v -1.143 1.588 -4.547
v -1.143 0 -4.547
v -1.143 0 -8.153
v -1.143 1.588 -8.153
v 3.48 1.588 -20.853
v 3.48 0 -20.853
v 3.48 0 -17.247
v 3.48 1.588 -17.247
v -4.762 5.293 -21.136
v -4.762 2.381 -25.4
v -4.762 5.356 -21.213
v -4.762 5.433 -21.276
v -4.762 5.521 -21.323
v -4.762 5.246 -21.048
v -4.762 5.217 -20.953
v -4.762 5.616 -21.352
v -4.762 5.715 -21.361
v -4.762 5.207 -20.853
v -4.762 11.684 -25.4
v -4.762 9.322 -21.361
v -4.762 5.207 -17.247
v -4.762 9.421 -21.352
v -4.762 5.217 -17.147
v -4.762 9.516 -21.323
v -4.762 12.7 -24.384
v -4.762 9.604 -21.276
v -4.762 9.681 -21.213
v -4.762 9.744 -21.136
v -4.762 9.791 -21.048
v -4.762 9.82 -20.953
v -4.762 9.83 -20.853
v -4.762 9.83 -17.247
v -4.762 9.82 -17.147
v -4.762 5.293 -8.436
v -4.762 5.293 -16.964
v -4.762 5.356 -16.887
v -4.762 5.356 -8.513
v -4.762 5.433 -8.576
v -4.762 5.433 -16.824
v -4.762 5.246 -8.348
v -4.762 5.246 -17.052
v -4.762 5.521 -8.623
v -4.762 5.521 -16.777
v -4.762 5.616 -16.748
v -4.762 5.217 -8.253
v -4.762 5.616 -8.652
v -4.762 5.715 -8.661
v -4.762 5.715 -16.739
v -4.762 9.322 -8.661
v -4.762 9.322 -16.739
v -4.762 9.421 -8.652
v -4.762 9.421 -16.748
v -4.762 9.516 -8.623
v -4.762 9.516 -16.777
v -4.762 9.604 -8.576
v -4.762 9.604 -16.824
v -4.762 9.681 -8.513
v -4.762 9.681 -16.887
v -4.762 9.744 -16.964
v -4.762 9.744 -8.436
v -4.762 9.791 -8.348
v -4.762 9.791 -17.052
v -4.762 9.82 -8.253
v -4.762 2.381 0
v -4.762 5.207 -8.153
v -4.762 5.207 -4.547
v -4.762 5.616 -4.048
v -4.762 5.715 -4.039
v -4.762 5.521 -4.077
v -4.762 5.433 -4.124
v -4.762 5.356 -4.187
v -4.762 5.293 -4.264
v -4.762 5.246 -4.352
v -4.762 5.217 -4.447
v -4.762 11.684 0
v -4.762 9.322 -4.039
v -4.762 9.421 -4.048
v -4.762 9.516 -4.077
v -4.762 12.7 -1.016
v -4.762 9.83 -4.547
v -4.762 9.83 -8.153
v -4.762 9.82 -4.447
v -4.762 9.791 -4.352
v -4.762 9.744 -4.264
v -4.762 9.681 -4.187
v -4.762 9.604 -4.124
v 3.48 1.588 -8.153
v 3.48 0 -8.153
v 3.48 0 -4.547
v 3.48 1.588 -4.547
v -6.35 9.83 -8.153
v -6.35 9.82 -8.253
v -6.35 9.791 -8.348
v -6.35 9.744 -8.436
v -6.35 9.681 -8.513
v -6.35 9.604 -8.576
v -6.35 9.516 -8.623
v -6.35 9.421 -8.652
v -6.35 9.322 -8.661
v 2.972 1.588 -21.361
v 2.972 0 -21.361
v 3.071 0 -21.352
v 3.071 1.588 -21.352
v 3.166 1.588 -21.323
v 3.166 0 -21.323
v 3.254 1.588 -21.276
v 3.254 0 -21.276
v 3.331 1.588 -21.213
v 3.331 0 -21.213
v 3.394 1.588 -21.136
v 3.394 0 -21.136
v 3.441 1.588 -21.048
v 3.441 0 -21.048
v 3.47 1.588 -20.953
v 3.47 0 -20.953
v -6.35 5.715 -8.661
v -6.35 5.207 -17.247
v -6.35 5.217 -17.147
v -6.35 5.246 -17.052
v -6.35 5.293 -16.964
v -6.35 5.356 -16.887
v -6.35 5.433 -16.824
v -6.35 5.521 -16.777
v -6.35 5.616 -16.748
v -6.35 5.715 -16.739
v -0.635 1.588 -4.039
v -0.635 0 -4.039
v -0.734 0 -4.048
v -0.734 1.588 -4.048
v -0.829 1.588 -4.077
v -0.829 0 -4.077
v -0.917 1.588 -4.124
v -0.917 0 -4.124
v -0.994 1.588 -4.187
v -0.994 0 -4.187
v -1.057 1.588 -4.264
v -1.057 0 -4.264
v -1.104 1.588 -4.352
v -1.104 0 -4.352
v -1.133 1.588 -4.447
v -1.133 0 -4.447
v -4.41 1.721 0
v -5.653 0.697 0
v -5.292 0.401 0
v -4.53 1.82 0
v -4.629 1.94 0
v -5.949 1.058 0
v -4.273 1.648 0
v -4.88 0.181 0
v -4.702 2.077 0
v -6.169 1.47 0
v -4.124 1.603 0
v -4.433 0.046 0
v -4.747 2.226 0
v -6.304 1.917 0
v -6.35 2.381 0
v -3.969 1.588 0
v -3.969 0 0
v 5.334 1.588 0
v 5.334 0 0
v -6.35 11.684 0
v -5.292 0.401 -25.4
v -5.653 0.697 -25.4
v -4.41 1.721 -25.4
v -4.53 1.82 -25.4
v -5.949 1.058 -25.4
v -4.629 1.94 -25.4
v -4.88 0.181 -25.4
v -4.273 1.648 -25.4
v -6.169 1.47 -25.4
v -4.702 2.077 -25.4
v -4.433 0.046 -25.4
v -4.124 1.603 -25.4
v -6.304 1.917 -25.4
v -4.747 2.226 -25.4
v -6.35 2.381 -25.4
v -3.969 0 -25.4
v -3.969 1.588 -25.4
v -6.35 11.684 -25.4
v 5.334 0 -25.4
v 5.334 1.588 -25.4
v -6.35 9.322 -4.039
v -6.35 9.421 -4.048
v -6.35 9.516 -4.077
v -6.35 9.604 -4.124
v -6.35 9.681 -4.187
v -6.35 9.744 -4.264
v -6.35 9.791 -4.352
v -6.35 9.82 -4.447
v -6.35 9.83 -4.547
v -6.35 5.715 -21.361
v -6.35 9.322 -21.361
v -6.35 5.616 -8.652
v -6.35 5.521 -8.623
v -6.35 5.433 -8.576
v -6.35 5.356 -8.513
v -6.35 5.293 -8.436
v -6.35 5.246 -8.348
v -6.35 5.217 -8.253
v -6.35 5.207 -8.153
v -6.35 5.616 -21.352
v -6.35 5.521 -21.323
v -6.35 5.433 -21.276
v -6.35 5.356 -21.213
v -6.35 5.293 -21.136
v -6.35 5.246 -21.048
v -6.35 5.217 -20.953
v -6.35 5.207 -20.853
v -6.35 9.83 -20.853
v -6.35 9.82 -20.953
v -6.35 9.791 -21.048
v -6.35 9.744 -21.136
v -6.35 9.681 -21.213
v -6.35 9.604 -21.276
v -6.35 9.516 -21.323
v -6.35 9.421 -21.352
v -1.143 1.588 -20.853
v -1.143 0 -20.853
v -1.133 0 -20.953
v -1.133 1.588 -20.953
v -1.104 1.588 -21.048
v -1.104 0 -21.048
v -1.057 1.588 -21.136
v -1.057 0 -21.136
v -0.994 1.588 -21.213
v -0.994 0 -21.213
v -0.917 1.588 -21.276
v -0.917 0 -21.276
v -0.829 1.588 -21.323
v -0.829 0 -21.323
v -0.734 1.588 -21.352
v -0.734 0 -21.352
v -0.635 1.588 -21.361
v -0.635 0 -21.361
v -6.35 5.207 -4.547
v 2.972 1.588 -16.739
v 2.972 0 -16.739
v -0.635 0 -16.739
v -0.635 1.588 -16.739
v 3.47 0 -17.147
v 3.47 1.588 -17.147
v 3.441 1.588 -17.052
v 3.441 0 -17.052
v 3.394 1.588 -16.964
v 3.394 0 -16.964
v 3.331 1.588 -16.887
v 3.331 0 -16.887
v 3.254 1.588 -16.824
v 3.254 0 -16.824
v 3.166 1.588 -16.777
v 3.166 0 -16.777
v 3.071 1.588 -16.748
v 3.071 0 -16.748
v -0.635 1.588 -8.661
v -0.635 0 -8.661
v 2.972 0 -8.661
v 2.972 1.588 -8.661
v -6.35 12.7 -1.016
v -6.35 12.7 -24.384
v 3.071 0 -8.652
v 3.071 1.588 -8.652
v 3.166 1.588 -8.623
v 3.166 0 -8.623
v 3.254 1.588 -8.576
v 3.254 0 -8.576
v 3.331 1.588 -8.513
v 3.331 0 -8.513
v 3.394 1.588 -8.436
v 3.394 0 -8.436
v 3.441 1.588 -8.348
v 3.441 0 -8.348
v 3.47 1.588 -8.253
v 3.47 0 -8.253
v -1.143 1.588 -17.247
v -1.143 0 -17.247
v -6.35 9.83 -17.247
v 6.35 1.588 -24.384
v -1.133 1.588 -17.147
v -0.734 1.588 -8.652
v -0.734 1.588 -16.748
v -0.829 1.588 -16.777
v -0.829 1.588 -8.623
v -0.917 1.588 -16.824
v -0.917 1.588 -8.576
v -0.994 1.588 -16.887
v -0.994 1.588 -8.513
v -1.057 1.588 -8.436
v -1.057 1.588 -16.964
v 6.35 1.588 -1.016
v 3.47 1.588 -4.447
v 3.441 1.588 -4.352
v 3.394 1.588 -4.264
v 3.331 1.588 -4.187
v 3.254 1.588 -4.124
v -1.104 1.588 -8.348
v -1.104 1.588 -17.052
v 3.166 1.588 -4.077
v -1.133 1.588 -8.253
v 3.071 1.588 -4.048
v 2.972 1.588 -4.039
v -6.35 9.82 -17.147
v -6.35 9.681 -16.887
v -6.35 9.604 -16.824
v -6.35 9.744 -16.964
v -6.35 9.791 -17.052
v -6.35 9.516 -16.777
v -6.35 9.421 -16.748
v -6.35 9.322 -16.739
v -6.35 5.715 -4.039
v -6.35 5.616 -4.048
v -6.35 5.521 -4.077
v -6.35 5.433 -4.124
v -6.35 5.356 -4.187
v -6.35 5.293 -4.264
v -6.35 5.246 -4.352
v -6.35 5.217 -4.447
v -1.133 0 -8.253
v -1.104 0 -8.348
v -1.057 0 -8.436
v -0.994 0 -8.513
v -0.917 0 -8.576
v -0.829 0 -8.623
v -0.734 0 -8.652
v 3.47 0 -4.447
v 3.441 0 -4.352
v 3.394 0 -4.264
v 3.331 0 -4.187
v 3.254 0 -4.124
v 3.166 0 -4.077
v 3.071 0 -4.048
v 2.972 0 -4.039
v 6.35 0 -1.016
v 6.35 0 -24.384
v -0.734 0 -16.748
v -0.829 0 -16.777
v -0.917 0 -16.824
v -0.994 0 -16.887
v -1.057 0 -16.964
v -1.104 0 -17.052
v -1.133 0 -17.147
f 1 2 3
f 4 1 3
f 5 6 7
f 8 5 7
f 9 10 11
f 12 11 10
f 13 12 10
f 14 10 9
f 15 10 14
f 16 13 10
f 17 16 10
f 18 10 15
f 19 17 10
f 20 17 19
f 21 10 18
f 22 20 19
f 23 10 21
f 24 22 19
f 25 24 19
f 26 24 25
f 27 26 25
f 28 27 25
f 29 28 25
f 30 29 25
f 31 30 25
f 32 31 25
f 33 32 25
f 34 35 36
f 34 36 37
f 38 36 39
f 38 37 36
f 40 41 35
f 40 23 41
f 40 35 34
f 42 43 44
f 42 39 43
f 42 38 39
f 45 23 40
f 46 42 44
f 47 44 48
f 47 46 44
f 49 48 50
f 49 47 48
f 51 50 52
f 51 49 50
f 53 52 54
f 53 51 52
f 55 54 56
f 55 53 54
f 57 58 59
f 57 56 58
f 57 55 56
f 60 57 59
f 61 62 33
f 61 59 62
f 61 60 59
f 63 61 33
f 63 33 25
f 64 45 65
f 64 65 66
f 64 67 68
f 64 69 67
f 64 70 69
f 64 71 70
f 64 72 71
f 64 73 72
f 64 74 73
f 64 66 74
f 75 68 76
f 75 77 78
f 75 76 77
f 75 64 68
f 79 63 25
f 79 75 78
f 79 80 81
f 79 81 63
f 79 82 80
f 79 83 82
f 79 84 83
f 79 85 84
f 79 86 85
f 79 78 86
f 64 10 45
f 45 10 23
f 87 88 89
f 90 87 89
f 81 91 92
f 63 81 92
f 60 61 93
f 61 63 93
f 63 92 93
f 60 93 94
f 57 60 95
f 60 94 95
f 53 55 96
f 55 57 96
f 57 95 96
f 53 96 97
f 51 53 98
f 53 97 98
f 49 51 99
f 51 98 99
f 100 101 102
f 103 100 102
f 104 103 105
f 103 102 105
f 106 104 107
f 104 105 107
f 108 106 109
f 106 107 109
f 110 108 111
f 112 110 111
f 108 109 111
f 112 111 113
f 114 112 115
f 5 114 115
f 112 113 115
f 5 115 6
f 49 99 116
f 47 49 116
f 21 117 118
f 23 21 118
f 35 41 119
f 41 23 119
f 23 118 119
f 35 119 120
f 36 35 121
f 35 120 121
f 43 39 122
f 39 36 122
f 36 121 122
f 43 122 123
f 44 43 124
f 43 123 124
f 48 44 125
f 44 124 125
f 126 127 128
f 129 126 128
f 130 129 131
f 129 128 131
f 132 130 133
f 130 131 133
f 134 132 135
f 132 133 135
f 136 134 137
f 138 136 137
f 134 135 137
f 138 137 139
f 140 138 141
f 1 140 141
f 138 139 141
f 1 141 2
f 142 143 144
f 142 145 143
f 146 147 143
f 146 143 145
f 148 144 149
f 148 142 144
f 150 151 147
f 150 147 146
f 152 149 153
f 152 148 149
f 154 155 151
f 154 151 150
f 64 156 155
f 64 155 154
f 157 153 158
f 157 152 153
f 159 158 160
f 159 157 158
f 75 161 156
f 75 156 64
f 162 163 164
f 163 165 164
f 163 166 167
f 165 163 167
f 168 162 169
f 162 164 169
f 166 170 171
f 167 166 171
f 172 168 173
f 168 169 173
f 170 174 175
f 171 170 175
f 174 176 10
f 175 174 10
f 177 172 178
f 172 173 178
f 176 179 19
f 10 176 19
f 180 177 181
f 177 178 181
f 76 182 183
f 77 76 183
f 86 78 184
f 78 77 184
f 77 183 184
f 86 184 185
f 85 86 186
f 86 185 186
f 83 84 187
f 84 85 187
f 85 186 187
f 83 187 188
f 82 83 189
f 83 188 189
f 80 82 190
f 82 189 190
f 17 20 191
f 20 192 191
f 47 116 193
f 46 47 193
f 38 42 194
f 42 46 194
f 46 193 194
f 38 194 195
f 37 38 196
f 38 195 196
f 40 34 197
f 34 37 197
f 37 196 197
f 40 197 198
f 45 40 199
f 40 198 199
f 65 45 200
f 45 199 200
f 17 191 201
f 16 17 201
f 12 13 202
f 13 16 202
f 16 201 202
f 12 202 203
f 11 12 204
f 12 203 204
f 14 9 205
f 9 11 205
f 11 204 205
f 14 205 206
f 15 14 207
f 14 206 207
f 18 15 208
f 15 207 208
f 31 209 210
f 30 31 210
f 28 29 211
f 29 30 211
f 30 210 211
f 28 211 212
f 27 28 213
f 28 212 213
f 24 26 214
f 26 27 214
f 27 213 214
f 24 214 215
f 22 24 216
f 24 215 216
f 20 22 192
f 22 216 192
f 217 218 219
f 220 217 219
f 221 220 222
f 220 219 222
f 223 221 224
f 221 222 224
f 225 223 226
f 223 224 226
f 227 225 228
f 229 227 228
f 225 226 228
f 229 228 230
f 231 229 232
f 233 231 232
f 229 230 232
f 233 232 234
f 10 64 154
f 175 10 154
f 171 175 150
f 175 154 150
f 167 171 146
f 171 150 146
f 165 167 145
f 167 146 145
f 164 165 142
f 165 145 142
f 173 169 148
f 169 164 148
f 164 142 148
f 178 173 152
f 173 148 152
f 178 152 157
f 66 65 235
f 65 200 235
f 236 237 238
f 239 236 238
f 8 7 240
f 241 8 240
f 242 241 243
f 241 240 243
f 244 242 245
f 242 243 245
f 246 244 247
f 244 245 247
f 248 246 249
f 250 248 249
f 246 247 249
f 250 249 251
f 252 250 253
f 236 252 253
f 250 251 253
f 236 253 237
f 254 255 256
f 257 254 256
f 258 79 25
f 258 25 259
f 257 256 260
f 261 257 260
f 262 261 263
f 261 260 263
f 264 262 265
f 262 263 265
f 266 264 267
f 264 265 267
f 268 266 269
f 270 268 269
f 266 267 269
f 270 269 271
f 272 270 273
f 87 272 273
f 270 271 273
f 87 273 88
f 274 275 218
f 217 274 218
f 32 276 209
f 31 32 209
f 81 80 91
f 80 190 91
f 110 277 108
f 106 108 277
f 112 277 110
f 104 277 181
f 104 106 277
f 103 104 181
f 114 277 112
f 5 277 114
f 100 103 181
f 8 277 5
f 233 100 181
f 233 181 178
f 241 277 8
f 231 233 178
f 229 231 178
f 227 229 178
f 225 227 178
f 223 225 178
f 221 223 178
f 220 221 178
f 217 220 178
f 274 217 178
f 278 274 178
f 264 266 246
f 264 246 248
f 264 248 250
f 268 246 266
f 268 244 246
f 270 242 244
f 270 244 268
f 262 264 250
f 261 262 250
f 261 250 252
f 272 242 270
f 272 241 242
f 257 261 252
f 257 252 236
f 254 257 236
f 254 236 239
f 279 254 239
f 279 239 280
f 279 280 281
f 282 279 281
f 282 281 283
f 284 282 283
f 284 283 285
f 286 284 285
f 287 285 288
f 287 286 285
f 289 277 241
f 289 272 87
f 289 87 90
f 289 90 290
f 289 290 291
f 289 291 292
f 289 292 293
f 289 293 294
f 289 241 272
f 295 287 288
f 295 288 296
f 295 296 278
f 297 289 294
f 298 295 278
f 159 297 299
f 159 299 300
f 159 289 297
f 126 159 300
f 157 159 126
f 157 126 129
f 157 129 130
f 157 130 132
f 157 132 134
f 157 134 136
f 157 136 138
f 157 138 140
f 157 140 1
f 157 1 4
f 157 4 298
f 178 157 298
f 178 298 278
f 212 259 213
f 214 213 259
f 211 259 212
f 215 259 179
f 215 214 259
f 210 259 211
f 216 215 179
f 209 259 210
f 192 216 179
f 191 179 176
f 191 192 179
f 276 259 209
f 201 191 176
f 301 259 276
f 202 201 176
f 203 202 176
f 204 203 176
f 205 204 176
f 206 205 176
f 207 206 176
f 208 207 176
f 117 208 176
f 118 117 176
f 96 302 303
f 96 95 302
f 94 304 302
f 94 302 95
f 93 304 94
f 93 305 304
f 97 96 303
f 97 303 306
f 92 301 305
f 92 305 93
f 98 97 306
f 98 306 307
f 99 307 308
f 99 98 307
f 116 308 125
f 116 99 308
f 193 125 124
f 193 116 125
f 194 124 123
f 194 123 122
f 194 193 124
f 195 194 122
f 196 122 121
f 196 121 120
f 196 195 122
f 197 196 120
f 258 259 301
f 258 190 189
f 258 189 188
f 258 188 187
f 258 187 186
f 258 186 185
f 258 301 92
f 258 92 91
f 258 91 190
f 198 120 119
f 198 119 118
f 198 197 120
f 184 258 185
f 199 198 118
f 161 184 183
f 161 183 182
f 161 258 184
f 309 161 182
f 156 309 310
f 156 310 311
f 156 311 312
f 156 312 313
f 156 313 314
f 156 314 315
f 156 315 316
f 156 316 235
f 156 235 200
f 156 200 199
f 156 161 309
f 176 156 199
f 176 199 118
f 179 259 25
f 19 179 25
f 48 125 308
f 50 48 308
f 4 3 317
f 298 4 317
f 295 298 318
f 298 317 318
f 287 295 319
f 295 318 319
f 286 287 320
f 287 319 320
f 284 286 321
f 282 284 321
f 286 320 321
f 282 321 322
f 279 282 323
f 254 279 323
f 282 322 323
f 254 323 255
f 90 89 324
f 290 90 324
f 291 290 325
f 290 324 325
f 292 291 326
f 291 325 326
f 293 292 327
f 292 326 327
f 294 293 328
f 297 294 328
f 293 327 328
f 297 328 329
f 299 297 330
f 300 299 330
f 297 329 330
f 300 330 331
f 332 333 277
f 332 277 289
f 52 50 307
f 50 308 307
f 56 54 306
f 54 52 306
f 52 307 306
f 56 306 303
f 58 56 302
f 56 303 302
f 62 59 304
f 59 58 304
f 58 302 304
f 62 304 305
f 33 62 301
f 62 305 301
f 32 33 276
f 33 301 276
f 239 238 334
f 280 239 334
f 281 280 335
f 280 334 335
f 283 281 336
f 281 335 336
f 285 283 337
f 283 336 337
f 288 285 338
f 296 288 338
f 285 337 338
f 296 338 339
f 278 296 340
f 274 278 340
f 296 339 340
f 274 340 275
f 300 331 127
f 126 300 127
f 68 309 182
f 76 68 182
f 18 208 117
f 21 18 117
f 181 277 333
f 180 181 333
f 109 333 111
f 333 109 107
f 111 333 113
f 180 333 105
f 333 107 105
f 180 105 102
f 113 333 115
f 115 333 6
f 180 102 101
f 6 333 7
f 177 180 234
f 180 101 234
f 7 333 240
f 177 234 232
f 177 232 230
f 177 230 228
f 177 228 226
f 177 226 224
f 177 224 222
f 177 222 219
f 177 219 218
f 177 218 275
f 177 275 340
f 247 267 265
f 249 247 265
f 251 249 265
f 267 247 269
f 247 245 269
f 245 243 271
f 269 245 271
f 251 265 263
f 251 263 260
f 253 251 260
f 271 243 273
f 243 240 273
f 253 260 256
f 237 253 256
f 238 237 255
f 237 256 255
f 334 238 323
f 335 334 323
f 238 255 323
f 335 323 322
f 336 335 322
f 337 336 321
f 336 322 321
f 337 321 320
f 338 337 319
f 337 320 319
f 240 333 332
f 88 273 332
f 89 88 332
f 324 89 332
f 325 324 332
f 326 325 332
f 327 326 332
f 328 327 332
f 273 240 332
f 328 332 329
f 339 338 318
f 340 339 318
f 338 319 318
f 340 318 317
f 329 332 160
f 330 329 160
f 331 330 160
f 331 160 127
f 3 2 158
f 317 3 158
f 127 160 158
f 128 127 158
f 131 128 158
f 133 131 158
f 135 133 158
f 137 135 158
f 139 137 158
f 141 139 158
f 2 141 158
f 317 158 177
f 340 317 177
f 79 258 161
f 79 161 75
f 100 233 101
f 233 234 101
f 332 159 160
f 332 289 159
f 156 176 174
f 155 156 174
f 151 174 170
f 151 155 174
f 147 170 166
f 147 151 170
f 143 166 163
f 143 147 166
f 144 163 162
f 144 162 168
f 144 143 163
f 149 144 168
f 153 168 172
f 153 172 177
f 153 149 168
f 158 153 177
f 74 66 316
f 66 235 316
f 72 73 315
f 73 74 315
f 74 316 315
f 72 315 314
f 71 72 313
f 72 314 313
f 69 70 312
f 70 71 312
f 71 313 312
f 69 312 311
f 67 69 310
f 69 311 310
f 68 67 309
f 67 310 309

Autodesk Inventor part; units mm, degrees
ref_plane "YZ Plane" through (0, 0, 0) normal (1, 0, 0) x (0, 1, 0)
ref_plane "XZ Plane" through (0, 0, 0) normal (0, 1, 0) x (-1, 0, 0)
sketch "Sketch1" plane through (0, 0, 0) normal (0, 1, 0) x (-1, 0, 0)
  line L0 (-6.35, 0) -> (6.35, 0)
  line L1 (6.35, 0) -> (6.35, -25.4)
  line L2 (6.35, -25.4) -> (-6.35, -25.4)
  line L3 (-6.35, -25.4) -> (-6.35, 0)
  line L4 (6.35, 0) -> (-6.35, -25.4) construction
  point P0 (0, 0)
  point P1 (0, 0)
  dimension "d0" = 12.7
  dimension "d1" = 25.4
extrude "Plate1" add sketch "Sketch1" along normal blind 1.5875
sketch "Sketch2" plane through (-4.7625, 0, 0) normal (-1, 0, 0) x (0, -1, 0)
  line L0 (0, -25.4) -> (0, 0)
  line L1 (0, 0) -> (-12.7, 0)
  line L2 (-12.7, 0) -> (-12.7, -25.4)
  line L3 (-12.7, -25.4) -> (0, -25.4)
edge flange "Flanges" height 12.7 angle 90 thickness 1.5875 bend radius 0.7937 thickness toward (-1, 0, 0) relief tear relief width 1.5875 relief depth 0.7937 edges at (-6.35, 1.5875, -12.7) wall of the first edge with corners at (-4.7625, 0, -25.4) (-4.7625, 0, 0) (-4.7625, 12.7, 0) (-4.7625, 12.7, -25.4)
bend "Bend1"
corner "Corner1"
sketch "Sketch8" plane through (0, 0, 0) normal (0, -1, 0) x (1, 0, 0)
  line L0 (6.35, 0) -> (-3.9687, 0) construction
  line L1 (2.9718, -4.0386) -> (-0.635, -4.0386)
  line L2 (-1.143, -4.5466) -> (-1.143, -8.1534)
  line L3 (-0.635, -8.6614) -> (2.9718, -8.6614)
  line L4 (3.4798, -8.1534) -> (3.4798, -4.5466)
  arc A0 (3.4798, -4.5466) -> (2.9718, -4.0386) centre (2.9718, -4.5466) ccw
  arc A1 (2.9718, -8.6614) -> (3.4798, -8.1534) centre (2.9718, -8.1534) ccw
  arc A2 (-1.143, -8.1534) -> (-0.635, -8.6614) centre (-0.635, -8.1534) ccw
  arc A3 (-0.635, -4.0386) -> (-1.143, -4.5466) centre (-0.635, -4.5466) ccw
  line L5 (2.9718, -4.5466) -> (-0.635, -8.1534) construction
  line L6 (6.35, -25.4) -> (6.35, 0) construction
  point P0 (0, 0)
  point P1 (-1.143, -8.6614)
  point P2 (3.4798, -8.6614)
  point P3 (12.7, 0)
  point P4 (1.1684, -6.35)
  dimension "d49" = 4.6228
  dimension "d50" = 0.508
  dimension "d52" = 6.35
  dimension "d123" = 5.1816
extrude "Body Stamp" cut sketch "Sketch8" against normal blind 1.5875
sketch "Sketch9" plane through (0, 0, 0) normal (0, -1, 0) x (1, 0, 0)
  arc A0 (3.4798, -4.5466) -> (2.9718, -4.0386) centre (2.9718, -4.5466) ccw construction
  arc A1 (-1.143, -8.1534) -> (-0.635, -8.6614) centre (-0.635, -8.1534) ccw construction
  line L0 (2.9718, -4.5466) -> (-0.635, -8.1534) construction
  circle A2 centre (1.1684, -6.35) radius 2.1844
  point P0 (0, 0)
  dimension "d55" = 4.3688
surface extrude "Body Circle" sketch "Sketch9" against normal up to surface (1.5875 mm away) shown yes curves A2
sketch "Body Pattern Sketch" plane through (0, 0, 0) normal (0, -1, 0) x (1, 0, 0)
  line L0 (1.1684, -6.35) -> (1.1684, 0) construction
  circle A0 centre (1.1684, -6.35) radius 2.1844 construction
  point P0 (1.1684, -19.05)
  dimension "d133" = 12.7
pattern_sketch "Body Pattern" of "Body Stamp", "Body Circle" from (1.1684, 0, -6.35) copies at (1.1684, 0, -19.05)
sketch "Arc Length" plane through (19.05, 2.3812, 0) normal (0, 0, 1) x (1, 0, 0)
  line L0 (-25.4, 0) -> (-23.8125, 0) projected
  arc A0 (-25.4, 0) -> (-23.0187, -2.3813) centre (-23.0187, 0) ccw projected
  line L1 (-23.0187, -0.7938) -> (-23.0187, -2.3813) projected
  arc A1 (-23.8125, 0) -> (-23.0187, -0.7938) centre (-23.0187, 0) ccw projected
  point P0 (-19.05, -2.3812)
  dimension "d126" = 1.2468
  dimension "d127" = 3.7405
feature "Notch" [suppressed]
pattern_linear "Notch Pattern" [suppressed]
ref_plane "Diagonal Plane" through (-4.7625, 1.5875, 0) normal (-0.7071068, 0.7071068, 0) x (0, 0, 1)
mirror "Everything Mirrored" about plane through (-4.7625, 1.5875, 0) normal (-0.7071068, 0.7071068, 0) of "Body Stamp", "Body Circle", "Body Pattern"
chamfer "End Chamfer" distance 1.016 angle 45 4 edges at (-5.5562, 12.7, -25.4) (-5.5562, 12.7, 0) (6.35, 0.7937, 0) (6.35, 0.7937, -25.4)
sketch "Sketch13" plane through (-6.35, 0, 419.1) normal (1, 0, 0) x (0, 0, -1)
  line L0 (480.568, 12.7) -> (482.6, 10.668)
  line L1 (482.6, 10.668) -> (484.632, 12.7)
  line L2 (480.568, 12.7) -> (484.632, 12.7)
  line L3 (482.6, 3.3973) -> (480.3372, 1.1344)
  line L4 (480.3372, 1.1344) -> (482.6, -1.1284)
  line L5 (482.6, -1.1284) -> (484.8628, 1.1344)
  line L6 (484.8628, 1.1344) -> (482.6, 3.3973)
  line L7 (482.6, 3.3973) -> (482.6, -1.1284) construction
  line L8 (482.6, 10.668) -> (482.6, 3.3973) construction
  line L9 (444.5, 12.7) -> (419.1, 12.7) projected
  line L10 (444.5, 2.3813) -> (419.1, 2.3813) construction
  line L11 (419.1, 12.7) -> (419.1, 2.3813) construction
  point P0 (444.5, -11.9062)
  point P1 (419.1, 0)
  dimension "d86" = 4.5256
  dimension "d128" = 2.032
  dimension "d129" = 1.016
  dimension "d130" = 63.5
equation "\"d53\" = Thickness"
equation "\"d89\" = Thickness"
equation "\"d1\" = 12.7 * Length"
equation "\"d2\" = Thickness"
equation "\"d3\" = BendReliefWidth"
equation "\"d4\" = BendReliefDepth"
equation "\"d5\" = MinimumRemnant"
equation "\"d6\" = TransitionRadius"
equation "\"d10\" = CornerReliefSize"
equation "\"d11\" = GapSize"
equation "\"d12\" = JacobiRadiusSize"
equation "\"BendRadius\" = Thickness"
equation "\"BendReliefWidth\" = Thickness"
equation "\"BendReliefDepth\" = 0.5 * Thickness"
equation "\"CornerReliefSize\" = 4 * Thickness"
equation "\"MinimumRemnant\" = 2 * Thickness"
equation "\"TransitionRadius\" = BendRadius"
equation "\"JacobiRadiusSize\" = BendRadius"
equation "\"GapSize\" = Thickness"
equation "\"Thickness\" = 1.5875"
equation "\"Length\" = 2"
properties part number "Alu C 1x2x1x35"
